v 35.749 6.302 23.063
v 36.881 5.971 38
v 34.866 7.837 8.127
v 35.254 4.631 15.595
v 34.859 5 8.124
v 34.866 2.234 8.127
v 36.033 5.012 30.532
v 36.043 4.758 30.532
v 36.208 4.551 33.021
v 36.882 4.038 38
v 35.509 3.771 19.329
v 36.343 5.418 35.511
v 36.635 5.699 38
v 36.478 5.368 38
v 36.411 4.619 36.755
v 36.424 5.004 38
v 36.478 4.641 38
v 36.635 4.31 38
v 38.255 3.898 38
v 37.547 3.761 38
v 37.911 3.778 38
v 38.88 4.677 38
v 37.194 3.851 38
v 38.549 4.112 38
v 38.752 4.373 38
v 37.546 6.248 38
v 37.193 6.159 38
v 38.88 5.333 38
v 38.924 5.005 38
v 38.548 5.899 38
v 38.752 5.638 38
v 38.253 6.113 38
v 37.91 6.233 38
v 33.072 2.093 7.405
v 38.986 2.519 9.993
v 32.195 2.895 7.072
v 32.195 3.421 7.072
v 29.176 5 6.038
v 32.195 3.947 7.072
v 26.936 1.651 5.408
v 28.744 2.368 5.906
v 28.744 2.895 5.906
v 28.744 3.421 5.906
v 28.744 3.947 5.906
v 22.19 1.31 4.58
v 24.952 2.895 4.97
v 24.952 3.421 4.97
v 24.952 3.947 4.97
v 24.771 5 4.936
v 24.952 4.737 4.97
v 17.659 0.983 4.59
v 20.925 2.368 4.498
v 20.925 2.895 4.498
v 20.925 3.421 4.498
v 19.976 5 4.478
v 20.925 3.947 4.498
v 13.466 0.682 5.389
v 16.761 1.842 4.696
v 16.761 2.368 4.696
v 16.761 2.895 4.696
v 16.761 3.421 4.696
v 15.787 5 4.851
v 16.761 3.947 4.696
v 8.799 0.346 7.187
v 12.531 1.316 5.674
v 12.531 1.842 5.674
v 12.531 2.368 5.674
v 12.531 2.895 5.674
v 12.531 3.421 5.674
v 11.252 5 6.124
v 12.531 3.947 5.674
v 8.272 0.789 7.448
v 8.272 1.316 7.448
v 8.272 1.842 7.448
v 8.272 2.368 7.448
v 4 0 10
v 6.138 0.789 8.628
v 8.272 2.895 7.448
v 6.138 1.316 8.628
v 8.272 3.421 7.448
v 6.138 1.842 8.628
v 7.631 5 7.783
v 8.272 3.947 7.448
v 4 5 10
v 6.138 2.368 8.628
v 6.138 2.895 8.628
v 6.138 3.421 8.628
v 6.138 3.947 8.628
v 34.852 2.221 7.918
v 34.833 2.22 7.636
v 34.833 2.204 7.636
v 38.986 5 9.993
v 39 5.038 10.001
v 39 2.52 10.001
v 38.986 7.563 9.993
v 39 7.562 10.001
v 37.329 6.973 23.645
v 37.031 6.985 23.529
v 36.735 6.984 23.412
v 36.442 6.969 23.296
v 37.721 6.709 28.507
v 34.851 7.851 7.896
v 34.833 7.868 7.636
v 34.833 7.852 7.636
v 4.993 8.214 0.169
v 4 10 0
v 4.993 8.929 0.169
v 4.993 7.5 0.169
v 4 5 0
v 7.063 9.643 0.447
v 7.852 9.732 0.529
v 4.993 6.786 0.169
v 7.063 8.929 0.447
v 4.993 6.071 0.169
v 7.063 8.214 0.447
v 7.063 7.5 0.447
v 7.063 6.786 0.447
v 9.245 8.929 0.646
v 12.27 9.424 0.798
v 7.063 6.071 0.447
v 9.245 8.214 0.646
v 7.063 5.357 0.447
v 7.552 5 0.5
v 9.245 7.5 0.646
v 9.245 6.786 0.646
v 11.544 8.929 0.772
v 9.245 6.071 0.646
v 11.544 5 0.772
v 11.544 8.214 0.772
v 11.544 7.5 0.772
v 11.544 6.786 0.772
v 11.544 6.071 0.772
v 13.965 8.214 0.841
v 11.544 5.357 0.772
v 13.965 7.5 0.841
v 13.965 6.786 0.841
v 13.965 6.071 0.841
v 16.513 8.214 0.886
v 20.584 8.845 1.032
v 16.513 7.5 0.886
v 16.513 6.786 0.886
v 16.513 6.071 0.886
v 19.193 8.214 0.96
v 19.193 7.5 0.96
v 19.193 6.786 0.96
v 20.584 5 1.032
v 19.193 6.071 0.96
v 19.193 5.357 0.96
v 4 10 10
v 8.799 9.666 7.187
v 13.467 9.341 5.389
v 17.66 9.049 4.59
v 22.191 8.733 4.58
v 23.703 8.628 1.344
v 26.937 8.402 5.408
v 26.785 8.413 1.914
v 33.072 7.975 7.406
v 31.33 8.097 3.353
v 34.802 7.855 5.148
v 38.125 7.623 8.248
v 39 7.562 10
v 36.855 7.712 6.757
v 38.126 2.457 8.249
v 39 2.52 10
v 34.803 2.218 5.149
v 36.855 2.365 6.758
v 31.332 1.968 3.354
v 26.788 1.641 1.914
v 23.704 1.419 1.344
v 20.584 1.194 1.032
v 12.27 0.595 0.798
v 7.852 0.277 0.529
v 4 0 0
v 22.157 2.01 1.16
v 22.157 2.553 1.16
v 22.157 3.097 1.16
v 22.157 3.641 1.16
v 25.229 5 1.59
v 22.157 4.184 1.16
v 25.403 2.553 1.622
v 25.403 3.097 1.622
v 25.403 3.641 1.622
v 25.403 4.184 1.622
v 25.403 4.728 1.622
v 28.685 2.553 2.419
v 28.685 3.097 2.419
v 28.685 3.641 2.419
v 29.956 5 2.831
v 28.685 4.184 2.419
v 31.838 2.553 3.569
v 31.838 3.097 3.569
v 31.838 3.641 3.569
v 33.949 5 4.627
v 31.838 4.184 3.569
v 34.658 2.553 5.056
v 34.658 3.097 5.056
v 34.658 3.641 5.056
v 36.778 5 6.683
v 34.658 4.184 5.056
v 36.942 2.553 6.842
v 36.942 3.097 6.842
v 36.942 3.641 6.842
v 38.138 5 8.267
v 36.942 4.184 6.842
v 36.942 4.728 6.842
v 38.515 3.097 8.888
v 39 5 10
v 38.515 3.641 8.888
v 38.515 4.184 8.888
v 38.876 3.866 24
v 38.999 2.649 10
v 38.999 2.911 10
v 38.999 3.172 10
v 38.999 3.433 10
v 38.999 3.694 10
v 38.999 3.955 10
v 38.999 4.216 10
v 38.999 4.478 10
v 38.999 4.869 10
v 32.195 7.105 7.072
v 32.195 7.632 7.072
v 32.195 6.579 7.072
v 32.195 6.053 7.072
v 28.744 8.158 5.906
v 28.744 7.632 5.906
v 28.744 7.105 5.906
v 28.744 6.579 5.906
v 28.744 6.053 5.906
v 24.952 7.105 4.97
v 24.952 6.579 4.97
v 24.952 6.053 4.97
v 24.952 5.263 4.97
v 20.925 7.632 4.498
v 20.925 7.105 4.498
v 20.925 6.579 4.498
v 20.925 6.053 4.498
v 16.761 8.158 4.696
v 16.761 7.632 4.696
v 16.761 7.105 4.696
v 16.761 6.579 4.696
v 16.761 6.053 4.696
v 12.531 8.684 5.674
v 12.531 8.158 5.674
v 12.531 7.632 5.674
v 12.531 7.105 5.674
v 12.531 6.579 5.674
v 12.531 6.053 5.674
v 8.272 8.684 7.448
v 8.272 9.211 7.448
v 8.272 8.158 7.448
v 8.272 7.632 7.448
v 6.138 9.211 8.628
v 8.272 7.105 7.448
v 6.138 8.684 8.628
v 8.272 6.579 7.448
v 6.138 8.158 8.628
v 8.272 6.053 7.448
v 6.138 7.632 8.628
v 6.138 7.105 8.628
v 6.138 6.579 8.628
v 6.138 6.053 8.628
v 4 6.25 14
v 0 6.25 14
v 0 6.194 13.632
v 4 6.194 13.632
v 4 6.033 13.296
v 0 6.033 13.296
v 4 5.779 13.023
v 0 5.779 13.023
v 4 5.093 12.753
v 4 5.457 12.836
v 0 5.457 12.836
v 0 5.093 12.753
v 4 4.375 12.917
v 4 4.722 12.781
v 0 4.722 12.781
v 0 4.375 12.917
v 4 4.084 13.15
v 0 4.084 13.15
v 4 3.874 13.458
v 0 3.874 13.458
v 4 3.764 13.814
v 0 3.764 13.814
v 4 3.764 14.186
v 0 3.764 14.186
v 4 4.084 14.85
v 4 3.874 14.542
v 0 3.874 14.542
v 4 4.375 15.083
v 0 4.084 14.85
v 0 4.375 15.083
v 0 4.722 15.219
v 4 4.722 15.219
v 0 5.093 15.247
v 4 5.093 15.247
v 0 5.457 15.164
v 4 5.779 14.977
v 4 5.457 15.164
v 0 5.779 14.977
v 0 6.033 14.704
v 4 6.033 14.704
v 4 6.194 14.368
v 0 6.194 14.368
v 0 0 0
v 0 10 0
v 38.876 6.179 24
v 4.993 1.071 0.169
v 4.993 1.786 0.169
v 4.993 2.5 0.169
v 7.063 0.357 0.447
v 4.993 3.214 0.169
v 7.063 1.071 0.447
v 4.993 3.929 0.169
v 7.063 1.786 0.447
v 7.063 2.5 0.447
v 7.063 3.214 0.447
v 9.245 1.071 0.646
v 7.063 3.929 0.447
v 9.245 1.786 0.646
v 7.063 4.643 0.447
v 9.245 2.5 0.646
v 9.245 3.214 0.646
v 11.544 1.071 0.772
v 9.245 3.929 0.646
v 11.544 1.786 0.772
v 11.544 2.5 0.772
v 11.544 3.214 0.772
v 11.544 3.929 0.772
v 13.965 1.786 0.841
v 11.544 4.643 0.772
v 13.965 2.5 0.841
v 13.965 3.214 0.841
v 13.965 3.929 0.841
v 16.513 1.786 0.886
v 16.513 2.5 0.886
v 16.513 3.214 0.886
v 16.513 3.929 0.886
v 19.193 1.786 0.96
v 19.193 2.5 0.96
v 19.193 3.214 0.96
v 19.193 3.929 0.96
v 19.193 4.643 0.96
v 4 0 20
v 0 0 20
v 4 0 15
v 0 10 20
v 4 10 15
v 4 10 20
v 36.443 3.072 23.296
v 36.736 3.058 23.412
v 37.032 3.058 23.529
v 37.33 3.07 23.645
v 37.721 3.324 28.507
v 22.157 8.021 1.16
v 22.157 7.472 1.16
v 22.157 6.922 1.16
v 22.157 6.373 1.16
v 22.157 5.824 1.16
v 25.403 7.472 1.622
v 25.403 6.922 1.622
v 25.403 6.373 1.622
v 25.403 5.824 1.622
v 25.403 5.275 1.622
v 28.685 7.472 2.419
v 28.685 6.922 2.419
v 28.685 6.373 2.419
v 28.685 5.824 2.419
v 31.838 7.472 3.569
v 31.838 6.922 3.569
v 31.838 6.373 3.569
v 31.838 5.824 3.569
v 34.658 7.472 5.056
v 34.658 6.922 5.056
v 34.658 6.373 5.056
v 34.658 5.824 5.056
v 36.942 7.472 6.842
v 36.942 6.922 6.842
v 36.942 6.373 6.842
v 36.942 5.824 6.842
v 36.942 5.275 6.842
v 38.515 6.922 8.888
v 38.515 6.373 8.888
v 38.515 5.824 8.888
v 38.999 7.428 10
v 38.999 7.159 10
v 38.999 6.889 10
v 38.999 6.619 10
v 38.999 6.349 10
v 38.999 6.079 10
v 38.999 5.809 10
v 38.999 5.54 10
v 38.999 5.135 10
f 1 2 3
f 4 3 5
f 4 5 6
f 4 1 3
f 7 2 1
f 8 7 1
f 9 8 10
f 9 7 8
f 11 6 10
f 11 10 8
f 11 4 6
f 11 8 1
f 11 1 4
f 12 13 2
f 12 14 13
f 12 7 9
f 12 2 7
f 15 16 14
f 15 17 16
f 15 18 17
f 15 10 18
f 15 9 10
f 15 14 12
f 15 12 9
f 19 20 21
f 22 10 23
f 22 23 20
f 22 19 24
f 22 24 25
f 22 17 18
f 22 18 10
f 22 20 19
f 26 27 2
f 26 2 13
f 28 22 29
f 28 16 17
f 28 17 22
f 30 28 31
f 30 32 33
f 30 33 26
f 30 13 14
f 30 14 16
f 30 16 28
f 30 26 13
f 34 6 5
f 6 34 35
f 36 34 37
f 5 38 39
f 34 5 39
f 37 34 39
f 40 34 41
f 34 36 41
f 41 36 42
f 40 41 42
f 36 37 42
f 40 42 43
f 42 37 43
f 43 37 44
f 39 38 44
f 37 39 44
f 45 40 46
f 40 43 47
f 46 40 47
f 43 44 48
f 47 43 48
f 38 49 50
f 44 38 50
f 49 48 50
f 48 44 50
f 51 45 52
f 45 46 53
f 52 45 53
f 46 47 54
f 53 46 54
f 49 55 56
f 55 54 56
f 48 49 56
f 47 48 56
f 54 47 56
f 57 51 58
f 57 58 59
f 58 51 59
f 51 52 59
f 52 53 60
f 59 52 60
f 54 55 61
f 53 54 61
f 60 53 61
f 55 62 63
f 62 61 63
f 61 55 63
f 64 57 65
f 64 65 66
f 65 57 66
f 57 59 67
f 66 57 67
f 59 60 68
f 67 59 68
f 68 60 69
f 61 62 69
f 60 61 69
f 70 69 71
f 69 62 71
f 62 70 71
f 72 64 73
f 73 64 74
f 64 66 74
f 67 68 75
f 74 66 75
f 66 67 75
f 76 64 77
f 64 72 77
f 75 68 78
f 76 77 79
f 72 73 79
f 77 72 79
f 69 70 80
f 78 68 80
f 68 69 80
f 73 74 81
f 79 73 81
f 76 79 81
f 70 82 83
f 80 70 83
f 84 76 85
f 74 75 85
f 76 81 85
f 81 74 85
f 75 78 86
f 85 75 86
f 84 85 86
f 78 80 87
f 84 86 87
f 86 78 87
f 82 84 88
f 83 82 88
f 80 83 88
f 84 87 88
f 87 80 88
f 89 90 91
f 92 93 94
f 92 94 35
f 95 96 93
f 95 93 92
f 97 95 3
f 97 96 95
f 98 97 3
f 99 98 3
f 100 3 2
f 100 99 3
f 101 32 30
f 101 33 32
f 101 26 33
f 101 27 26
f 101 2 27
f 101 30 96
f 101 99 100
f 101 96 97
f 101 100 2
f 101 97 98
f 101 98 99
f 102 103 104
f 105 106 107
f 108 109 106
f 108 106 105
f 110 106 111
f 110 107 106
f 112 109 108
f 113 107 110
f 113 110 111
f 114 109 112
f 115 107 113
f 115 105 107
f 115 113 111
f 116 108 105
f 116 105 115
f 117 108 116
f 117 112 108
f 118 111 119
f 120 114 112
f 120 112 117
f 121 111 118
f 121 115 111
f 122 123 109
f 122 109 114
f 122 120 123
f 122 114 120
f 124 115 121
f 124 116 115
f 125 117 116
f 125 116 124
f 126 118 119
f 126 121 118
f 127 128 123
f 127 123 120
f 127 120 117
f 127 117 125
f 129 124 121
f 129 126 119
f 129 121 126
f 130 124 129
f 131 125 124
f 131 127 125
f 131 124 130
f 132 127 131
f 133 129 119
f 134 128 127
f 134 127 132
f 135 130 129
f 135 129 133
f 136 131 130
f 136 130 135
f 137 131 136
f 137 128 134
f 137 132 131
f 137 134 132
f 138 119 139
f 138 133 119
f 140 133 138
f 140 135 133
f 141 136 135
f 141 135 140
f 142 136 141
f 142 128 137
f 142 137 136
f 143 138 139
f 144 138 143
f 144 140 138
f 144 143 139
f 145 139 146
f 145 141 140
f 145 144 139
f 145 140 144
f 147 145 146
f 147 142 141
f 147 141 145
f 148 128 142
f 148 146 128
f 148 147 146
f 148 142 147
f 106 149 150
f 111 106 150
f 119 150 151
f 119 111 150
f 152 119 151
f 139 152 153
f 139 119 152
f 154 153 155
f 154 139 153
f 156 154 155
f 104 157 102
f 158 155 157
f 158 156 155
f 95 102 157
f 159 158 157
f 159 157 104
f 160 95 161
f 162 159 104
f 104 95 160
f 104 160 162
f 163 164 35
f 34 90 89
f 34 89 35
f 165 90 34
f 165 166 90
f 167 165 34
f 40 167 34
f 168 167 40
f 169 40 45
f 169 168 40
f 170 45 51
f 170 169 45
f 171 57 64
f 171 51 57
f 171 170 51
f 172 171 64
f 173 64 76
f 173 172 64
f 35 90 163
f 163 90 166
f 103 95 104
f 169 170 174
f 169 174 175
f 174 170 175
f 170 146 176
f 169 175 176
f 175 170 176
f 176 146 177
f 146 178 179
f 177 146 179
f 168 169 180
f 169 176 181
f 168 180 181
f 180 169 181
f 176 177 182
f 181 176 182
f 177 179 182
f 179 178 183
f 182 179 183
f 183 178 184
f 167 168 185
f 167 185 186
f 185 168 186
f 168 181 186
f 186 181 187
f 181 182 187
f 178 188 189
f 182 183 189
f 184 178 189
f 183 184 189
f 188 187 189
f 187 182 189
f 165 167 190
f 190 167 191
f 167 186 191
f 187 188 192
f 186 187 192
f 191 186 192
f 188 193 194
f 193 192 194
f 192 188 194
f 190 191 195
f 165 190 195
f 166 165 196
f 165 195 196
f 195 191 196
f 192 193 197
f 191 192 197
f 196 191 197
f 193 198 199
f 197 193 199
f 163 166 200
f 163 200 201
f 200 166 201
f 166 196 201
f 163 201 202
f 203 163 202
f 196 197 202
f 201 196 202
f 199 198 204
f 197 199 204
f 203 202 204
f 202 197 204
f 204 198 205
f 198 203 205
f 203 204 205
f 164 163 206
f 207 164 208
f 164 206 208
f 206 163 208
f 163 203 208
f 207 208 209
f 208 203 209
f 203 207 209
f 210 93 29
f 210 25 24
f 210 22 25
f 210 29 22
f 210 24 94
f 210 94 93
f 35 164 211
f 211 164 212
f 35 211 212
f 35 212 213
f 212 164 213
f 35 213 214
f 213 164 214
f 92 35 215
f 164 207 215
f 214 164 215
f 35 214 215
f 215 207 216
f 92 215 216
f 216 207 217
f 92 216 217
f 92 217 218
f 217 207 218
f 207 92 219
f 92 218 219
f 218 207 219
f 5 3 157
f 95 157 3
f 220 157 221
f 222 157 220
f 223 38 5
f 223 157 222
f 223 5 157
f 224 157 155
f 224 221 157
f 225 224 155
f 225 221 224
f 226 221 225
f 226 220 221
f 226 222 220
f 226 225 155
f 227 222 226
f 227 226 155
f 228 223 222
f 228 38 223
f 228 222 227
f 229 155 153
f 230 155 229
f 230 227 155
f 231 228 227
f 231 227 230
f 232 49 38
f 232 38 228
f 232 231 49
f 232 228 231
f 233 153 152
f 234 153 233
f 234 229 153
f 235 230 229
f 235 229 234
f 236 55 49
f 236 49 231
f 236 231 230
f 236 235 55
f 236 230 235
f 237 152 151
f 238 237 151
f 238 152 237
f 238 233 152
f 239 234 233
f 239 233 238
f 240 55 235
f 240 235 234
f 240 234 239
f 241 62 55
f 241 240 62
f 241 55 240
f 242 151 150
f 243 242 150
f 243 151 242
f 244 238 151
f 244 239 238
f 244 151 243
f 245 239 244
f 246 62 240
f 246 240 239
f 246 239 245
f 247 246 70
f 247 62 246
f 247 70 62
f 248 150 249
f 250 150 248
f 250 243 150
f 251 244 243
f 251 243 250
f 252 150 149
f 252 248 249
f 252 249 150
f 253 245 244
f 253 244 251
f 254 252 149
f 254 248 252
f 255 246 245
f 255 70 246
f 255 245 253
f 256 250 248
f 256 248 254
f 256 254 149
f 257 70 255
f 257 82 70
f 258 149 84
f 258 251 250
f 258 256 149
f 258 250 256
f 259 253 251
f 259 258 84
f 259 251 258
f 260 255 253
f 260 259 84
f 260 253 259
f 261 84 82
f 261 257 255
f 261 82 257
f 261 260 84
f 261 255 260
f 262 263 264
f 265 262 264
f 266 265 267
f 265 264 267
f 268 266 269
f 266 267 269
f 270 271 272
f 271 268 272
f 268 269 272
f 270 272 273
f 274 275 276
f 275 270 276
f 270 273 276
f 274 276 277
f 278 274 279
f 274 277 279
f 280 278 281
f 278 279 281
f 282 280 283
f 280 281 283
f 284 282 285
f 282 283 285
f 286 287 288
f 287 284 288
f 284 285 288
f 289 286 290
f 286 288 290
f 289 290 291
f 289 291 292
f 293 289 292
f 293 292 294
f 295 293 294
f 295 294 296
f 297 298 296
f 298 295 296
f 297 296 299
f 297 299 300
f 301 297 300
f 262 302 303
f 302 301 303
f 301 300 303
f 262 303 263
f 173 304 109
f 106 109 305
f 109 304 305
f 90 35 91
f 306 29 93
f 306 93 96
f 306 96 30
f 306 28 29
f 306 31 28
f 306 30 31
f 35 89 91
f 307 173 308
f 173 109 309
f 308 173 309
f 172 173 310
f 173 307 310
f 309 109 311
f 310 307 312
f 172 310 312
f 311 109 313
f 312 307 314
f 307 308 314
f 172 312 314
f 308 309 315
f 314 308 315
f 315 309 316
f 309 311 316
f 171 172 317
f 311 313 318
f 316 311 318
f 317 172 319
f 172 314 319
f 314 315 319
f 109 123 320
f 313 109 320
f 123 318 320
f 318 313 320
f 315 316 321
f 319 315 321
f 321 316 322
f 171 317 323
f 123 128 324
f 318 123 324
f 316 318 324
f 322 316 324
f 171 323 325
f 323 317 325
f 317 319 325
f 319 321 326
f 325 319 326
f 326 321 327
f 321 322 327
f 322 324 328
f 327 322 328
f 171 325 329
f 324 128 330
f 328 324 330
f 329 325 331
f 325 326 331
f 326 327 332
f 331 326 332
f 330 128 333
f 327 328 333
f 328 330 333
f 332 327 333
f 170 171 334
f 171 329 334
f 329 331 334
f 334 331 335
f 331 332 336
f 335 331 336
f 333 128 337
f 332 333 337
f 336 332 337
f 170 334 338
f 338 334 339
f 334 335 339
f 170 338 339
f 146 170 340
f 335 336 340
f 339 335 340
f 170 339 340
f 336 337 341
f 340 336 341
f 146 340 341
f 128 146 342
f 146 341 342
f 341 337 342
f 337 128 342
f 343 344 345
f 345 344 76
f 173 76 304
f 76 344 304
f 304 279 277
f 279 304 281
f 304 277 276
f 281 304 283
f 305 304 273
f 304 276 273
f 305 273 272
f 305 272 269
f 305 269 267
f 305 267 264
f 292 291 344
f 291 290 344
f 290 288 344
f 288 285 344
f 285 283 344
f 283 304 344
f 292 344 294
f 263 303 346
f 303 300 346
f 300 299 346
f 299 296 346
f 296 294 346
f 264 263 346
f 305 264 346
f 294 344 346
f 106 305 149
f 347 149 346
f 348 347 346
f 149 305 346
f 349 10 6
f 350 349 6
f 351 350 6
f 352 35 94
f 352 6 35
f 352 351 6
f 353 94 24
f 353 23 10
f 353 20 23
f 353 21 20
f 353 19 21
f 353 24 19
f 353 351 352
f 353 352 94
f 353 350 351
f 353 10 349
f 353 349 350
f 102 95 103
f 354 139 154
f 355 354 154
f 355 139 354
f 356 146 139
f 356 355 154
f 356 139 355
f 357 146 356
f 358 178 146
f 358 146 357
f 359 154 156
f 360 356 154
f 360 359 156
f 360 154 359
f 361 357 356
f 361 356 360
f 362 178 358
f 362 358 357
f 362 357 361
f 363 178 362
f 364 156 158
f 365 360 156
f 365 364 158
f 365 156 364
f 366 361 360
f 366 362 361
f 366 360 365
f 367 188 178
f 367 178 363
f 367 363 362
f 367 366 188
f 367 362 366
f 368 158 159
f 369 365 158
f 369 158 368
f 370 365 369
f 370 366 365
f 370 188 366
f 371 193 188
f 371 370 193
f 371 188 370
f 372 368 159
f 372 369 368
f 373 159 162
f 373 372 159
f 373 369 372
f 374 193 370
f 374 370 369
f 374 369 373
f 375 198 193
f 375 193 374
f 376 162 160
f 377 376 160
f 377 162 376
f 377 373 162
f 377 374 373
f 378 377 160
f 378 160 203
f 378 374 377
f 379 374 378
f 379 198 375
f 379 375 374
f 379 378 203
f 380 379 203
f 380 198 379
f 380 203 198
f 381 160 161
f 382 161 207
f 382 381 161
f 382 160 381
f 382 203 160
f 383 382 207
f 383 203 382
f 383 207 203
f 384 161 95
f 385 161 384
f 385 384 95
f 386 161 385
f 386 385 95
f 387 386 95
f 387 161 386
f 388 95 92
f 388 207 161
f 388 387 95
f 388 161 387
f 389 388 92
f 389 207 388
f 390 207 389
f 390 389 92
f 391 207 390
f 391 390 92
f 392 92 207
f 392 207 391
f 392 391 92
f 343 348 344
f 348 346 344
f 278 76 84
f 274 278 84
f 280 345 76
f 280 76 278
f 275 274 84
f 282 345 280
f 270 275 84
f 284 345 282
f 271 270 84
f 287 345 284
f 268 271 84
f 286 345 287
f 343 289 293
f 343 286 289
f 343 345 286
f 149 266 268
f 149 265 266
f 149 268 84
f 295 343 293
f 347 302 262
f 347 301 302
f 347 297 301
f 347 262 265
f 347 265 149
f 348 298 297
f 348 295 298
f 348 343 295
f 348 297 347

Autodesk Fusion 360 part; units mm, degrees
sketch "Sketch1" plane through (0, 0, 0) normal (1, 0, 0) x (0, 1, 0)
  line L0 (0, 0) -> (10, 0)
  line L1 (10, 0) -> (10, 20)
  line L2 (10, 20) -> (0, 20)
  line L3 (0, 20) -> (0, 0)
  circle A0 centre (5, 14) radius 1.25
  line L4 (5, 20) -> (5, 0) construction
  dimension "d1" = 10
  dimension "d2" = 20
  dimension "d3" = 6
  dimension "d4" = 2.5
extrude "Extrude1" add sketch "Sketch1" along normal blind 4
ref_plane "WorkPlane1" through (0, 5, 0) normal (0, 1, 0) x (0, 0, 1)
sketch "Sketch2" plane through (0, 5, 0) normal (0, 1, 0) x (1, 0, 0)
  spline S0 degree 5 poles (4, 0) (4.5771, -0.1055) (5.7551, -0.2992) (7.5934, -0.5374) (10.1902, -0.7501) (13.6911, -0.8547) (17.4735, -0.8864) (21.5365, -0.9956) (25.924, -1.5675) (30.3819, -2.7889) (34.4435, -4.6461) (36.9623, -6.5714) (38.2422, -8.2146) (38.7971, -9.3913) (39, -10) knots 0 0 0 0 0 0 0.1 0.2 0.3 0.4 0.5 0.6 0.7 0.8 0.9 1 1 1 1 1 1
  line L0 (15.7367, -0.7193) -> (25.4307, -1.3448)
  line L1 (0, 0) -> (4, 0)
  line L2 (38, -7) -> (40, -13)
  spline S1 degree 5 poles (39, -10) (38.7242, -9.8626) (38.1556, -9.5847) (37.2514, -9.1586) (35.9422, -8.5717) (34.1308, -7.8106) (32.1444, -7.0347) (29.9895, -6.2707) (27.6837, -5.5654) (25.2519, -4.9777) (22.7222, -4.5714) (20.1223, -4.4064) (17.4768, -4.5309) (14.8034, -4.9704) (12.1137, -5.7332) (9.4148, -6.8176) (7.2511, -7.9369) (5.6263, -8.915) (4.5423, -9.6281) (4, -10) knots 0 0 0 0 0 0 0.066667 0.133333 0.2 0.266667 0.333333 0.4 0.466667 0.533333 0.6 0.666667 0.733333 0.8 0.866667 0.933333 1 1 1 1 1 1
  line L3 (4, 0) -> (4, -10)
  line L4 (39, -10) -> (30.4055, -5.1224)
  point P0 (20.5837, -1.0321)
  point P1 (32, -7)
  point P2 (19.692, -4.4795)
  dimension "d8" = 35
  dimension "d9" = 10
  dimension "d10" = 4
  dimension "d11" = 10
extrude "Extrude2" add sketch "Sketch2" along normal mid plane 10
sketch "Sketch3" plane through (0, 0, 0) normal (0, 0, -1) x (1, 0, 0)
  line L0 (0, 0) -> (0, -10)
  line L1 (0, -10) -> (4, -10)
  line L2 (4, -10) -> (4, 0)
  line L3 (4, 0) -> (0, 0)
  line L4 (4, -10) -> (39.3, -7.5414)
  line L5 (39.3, -7.5414) -> (39.3, -2.5414)
  line L6 (39.3, -2.5414) -> (4, 0)
  line L7 (4, -10) -> (44.4178, -17.1605)
  line L8 (44.4178, -17.1605) -> (44.4178, 8.7922)
  line L9 (44.4178, 8.7922) -> (4, 0)
  dimension "d16" = 5
  dimension "d17" = 35.3
extrude "Extrude3" cut sketch "Sketch3" against normal blind 15 contours L4 L5 L6 L7 L8 L9
ref_plane "WorkPlane2" through (39, 2.5199, 10) normal (-0.4936, 0, 0.8697) x (0, -1, 0)
sketch "Sketch4" plane through (5.2084, 0, -9.1775) normal (-0.4936, 0, 0.8697) x (0, -1, 0)
  line L0 (-7.5622, 38.8542) -> (-2.52, 38.8542)
  line L1 (-2.52, 38.8542) -> (-2.2042, 34.0638)
  line L2 (-2.2042, 34.0638) -> (-7.8675, 34.0638)
  line L3 (-7.8675, 34.0638) -> (-7.5622, 38.8542)
ref_plane "WorkPlane3" through (0, 0, 38) normal (0, 0, 1) x (1, 0, 0)
sketch "Sketch5" plane through (0, 0, 38) normal (0, 0, 1) x (1, 0, 0)
  circle A0 centre (37.674, 5.005) radius 1.25
  dimension "d25" = 2.5
loft "Loft1" add profiles "Sketch4", "Sketch5" section 1 section 2
